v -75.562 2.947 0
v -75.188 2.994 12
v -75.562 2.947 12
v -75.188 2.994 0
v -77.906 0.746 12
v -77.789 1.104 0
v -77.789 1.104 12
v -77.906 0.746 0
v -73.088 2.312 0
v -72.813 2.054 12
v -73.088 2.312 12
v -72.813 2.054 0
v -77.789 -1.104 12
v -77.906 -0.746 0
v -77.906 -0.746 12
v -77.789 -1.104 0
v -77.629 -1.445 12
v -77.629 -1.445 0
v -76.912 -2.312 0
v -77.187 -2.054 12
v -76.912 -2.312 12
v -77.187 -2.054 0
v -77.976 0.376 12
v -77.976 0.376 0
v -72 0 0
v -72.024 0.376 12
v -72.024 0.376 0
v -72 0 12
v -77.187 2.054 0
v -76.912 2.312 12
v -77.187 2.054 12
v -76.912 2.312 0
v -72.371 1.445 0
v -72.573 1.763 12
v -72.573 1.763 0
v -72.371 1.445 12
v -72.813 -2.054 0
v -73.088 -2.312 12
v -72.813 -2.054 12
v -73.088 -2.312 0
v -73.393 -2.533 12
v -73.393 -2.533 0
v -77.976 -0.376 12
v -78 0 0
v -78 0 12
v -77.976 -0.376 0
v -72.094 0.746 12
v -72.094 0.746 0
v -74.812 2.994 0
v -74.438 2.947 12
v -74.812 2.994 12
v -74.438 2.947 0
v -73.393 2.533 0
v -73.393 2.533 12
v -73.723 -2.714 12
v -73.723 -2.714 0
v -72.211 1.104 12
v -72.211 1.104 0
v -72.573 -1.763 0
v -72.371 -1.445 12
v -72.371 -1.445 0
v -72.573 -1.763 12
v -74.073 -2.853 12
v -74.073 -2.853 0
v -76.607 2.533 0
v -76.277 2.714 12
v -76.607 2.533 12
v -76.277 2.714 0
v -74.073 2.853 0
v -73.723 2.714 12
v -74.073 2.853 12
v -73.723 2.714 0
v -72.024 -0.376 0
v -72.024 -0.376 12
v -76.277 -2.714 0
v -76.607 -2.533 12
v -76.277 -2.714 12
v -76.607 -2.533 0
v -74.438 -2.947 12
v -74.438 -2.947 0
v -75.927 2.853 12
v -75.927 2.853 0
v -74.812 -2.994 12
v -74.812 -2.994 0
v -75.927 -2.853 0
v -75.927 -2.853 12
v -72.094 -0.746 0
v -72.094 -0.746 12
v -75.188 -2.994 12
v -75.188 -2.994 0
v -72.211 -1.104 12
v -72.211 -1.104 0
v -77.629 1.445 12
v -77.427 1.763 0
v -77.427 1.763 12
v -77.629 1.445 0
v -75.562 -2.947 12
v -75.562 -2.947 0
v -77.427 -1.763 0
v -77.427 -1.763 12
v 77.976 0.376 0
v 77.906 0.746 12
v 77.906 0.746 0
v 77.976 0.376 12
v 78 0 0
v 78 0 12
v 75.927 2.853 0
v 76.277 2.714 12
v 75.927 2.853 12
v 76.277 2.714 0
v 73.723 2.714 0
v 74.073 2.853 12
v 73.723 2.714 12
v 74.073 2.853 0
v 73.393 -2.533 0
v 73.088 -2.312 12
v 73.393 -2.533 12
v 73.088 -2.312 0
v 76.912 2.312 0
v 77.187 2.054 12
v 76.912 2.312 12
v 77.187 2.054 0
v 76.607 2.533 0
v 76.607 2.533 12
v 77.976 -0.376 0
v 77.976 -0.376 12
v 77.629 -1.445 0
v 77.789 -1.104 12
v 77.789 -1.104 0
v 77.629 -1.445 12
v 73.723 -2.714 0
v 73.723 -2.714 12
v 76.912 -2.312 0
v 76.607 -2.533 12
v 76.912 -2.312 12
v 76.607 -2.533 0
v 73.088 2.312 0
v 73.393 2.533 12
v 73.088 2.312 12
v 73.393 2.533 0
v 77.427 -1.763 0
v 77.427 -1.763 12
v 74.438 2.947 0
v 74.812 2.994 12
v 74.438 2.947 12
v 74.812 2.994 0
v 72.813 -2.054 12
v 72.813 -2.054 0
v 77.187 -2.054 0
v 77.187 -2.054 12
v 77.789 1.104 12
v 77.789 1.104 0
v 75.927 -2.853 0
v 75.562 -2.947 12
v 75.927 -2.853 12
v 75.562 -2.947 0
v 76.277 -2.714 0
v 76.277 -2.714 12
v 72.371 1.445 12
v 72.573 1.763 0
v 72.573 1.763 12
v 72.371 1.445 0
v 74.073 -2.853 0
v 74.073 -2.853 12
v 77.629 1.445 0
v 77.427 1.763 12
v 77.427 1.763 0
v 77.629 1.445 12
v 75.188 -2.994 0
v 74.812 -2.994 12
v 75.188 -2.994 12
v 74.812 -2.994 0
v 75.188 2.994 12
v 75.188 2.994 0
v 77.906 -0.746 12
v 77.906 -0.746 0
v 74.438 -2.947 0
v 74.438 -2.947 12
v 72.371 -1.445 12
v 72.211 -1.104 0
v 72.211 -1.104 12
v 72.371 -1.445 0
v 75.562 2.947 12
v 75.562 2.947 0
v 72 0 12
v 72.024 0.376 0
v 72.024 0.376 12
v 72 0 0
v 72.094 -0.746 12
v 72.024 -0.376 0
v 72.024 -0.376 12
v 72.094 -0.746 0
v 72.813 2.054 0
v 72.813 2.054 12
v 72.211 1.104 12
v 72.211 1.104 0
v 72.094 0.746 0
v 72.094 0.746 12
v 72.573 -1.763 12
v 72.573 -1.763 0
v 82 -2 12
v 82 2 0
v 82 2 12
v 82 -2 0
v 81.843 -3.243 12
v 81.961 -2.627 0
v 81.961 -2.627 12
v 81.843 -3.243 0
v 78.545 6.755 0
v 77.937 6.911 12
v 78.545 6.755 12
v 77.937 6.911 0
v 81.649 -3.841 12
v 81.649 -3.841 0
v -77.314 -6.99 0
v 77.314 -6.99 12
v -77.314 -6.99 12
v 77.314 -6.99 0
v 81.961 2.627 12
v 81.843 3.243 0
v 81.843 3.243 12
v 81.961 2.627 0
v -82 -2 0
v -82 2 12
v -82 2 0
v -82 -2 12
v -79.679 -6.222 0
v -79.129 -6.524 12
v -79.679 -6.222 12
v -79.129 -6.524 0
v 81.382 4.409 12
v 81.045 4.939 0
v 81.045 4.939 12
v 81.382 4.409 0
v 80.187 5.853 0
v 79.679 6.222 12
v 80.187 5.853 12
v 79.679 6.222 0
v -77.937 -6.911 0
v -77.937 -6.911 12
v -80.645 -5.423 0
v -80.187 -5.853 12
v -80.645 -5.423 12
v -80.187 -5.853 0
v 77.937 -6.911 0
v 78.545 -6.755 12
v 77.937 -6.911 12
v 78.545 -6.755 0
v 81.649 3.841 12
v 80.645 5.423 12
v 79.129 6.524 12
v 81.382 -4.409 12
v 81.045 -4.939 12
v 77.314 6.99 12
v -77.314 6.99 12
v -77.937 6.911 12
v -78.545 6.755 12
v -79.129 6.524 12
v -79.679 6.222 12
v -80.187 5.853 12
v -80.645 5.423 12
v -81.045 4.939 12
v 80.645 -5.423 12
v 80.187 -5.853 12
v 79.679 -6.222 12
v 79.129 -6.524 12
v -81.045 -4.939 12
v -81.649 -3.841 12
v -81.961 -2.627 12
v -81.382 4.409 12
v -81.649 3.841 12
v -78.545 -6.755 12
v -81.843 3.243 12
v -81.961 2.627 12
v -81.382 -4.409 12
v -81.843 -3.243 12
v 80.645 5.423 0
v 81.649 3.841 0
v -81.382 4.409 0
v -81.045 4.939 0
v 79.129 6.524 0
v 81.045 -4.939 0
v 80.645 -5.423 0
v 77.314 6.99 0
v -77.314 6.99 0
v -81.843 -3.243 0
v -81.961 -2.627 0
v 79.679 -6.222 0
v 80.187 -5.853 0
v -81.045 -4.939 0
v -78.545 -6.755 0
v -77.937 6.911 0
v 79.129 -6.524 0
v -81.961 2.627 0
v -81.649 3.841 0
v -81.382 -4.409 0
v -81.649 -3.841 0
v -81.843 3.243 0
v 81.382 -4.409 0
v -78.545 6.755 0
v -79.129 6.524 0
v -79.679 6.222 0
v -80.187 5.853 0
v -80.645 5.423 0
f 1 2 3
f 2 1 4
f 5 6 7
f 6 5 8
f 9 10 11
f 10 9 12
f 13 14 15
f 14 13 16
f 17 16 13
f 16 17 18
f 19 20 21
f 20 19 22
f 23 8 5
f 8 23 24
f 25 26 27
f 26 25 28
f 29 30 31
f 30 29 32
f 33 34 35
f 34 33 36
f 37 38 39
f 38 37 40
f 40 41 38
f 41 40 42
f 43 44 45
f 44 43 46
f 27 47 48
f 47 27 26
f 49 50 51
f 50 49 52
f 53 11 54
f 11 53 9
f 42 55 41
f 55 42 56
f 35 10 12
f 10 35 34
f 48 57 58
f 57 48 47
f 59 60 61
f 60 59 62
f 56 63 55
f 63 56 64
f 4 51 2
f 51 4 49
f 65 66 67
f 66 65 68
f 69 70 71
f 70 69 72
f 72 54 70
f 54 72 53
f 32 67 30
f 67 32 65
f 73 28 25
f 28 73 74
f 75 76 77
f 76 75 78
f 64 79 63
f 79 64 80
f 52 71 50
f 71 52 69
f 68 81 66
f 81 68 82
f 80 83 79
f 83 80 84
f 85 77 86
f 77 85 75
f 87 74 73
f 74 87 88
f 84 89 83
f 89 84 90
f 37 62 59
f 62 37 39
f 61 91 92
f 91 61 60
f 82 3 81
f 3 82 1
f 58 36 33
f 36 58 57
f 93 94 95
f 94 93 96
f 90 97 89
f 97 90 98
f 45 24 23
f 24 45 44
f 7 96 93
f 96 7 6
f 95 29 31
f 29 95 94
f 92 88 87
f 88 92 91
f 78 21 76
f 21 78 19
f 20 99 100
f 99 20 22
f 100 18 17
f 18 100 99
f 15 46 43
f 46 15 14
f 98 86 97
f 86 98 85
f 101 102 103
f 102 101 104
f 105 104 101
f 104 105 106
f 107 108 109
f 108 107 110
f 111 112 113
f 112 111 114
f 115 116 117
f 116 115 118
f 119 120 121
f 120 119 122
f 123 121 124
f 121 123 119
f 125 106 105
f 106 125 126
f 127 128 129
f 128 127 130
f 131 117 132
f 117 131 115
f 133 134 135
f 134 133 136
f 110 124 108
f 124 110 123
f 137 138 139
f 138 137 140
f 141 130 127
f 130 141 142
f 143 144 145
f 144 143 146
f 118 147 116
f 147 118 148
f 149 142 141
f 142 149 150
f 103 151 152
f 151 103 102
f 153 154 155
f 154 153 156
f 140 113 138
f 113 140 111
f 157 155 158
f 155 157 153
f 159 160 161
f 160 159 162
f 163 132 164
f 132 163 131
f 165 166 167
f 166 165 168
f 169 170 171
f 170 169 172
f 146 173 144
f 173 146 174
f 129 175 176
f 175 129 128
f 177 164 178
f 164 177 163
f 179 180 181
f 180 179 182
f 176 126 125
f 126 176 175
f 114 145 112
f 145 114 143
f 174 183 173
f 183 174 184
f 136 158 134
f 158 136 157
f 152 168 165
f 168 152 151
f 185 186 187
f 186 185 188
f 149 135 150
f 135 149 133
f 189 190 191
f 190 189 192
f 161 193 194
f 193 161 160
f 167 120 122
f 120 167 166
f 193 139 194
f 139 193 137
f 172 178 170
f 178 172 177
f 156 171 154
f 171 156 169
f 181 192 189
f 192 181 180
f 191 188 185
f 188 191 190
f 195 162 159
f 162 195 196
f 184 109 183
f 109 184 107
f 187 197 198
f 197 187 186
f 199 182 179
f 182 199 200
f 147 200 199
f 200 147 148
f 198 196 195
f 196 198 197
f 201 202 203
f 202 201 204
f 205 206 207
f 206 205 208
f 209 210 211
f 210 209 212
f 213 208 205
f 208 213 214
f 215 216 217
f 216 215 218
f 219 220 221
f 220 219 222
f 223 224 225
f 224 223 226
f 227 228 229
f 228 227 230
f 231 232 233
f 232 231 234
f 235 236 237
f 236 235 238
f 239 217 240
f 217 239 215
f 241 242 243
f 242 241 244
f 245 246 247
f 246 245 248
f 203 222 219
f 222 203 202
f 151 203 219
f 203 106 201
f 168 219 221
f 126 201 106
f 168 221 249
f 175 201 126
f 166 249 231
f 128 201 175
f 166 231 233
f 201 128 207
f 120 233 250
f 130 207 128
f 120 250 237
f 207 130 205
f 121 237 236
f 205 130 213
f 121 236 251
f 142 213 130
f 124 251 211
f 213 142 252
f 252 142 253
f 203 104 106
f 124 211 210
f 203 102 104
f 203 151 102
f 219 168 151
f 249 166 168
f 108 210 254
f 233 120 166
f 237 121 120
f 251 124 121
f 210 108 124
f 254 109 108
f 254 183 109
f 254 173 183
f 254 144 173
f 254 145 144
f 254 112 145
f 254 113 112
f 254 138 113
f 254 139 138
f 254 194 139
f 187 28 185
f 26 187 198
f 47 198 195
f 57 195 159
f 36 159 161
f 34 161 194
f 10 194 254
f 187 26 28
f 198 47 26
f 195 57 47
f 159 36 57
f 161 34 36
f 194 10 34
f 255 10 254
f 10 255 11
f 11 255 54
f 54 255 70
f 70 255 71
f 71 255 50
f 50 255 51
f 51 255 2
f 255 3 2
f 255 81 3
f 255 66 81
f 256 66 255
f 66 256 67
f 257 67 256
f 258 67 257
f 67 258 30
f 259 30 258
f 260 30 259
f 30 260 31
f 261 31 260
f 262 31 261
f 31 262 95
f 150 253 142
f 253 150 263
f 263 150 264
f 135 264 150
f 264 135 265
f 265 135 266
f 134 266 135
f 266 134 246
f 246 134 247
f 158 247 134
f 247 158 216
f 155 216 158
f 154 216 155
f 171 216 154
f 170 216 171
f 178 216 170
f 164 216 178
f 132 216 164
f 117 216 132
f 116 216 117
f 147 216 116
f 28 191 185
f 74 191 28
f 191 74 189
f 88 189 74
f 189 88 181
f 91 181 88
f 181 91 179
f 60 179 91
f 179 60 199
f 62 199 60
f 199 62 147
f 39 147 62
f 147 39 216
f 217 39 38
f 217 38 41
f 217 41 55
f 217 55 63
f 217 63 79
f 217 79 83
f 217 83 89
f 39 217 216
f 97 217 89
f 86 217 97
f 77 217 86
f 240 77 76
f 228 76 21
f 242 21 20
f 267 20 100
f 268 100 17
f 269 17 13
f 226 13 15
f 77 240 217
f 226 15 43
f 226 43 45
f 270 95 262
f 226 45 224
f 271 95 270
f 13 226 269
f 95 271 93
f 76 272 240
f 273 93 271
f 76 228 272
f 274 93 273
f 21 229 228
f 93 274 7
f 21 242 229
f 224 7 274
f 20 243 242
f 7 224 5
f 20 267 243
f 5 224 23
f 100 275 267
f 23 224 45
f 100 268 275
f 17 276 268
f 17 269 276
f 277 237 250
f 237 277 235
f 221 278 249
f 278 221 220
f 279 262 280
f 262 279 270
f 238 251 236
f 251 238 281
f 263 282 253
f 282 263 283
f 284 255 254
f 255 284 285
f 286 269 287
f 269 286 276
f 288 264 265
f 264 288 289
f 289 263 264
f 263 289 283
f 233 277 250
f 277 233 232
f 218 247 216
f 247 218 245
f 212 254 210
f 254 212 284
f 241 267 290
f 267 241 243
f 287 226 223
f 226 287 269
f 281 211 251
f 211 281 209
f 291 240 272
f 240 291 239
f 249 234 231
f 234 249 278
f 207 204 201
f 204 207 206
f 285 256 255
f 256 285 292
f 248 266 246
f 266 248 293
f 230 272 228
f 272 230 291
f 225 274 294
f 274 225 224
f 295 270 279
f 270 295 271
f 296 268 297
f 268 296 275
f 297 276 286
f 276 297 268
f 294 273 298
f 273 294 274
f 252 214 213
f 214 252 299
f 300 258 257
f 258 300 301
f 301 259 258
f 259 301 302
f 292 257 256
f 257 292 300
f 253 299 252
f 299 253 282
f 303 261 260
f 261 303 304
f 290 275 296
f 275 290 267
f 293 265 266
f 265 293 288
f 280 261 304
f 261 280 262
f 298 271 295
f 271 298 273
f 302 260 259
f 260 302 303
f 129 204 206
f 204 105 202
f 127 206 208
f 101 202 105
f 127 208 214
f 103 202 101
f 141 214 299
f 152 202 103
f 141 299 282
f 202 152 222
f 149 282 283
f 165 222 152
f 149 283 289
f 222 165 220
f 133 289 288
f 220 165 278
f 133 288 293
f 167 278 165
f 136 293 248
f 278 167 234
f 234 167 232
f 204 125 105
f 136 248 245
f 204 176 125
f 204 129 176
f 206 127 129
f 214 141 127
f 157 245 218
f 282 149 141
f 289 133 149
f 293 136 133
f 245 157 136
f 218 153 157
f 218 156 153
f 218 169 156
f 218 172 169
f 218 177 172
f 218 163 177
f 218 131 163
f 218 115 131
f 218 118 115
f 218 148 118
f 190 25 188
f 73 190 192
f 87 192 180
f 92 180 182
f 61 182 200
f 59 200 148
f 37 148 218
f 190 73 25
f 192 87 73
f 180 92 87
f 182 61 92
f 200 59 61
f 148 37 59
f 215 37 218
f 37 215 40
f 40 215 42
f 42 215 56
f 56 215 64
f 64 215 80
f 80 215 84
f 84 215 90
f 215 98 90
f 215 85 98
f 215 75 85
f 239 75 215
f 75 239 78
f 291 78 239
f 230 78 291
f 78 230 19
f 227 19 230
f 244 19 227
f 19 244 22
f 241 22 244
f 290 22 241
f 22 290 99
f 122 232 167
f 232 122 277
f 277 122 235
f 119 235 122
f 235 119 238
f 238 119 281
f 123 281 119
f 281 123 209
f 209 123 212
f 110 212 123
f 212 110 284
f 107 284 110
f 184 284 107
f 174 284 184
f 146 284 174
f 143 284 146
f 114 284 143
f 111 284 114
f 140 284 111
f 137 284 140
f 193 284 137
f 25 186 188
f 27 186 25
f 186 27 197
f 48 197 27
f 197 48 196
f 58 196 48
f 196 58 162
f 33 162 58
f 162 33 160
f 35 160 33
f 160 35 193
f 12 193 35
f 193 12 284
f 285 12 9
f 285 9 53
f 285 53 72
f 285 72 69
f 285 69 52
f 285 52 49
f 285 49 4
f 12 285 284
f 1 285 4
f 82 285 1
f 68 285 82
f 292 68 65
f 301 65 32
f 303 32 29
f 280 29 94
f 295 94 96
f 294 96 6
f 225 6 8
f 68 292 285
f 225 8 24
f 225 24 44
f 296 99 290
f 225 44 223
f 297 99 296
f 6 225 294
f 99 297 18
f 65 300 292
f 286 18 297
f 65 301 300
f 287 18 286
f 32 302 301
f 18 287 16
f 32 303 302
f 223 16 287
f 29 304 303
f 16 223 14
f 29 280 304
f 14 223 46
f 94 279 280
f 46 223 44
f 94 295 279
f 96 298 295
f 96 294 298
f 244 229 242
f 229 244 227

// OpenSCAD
$fn = 50;


difference() {
	union() {
		hull() {
			translate(v = [-77.0000000000, 2.0000000000, 0]) {
				cylinder(h = 12, r = 5);
			}
			translate(v = [77.0000000000, 2.0000000000, 0]) {
				cylinder(h = 12, r = 5);
			}
			translate(v = [-77.0000000000, -2.0000000000, 0]) {
				cylinder(h = 12, r = 5);
			}
			translate(v = [77.0000000000, -2.0000000000, 0]) {
				cylinder(h = 12, r = 5);
			}
		}
	}
	union() {
		translate(v = [-75.0000000000, 0.0000000000, -100.0000000000]) {
			cylinder(h = 200, r = 3.0000000000);
		}
		translate(v = [-75.0000000000, 0.0000000000, -100.0000000000]) {
			cylinder(h = 200, r = 3.0000000000);
		}
		translate(v = [75.0000000000, 0.0000000000, -100.0000000000]) {
			cylinder(h = 200, r = 3.0000000000);
		}
		translate(v = [75.0000000000, 0.0000000000, -100.0000000000]) {
			cylinder(h = 200, r = 3.0000000000);
		}
	}
}
